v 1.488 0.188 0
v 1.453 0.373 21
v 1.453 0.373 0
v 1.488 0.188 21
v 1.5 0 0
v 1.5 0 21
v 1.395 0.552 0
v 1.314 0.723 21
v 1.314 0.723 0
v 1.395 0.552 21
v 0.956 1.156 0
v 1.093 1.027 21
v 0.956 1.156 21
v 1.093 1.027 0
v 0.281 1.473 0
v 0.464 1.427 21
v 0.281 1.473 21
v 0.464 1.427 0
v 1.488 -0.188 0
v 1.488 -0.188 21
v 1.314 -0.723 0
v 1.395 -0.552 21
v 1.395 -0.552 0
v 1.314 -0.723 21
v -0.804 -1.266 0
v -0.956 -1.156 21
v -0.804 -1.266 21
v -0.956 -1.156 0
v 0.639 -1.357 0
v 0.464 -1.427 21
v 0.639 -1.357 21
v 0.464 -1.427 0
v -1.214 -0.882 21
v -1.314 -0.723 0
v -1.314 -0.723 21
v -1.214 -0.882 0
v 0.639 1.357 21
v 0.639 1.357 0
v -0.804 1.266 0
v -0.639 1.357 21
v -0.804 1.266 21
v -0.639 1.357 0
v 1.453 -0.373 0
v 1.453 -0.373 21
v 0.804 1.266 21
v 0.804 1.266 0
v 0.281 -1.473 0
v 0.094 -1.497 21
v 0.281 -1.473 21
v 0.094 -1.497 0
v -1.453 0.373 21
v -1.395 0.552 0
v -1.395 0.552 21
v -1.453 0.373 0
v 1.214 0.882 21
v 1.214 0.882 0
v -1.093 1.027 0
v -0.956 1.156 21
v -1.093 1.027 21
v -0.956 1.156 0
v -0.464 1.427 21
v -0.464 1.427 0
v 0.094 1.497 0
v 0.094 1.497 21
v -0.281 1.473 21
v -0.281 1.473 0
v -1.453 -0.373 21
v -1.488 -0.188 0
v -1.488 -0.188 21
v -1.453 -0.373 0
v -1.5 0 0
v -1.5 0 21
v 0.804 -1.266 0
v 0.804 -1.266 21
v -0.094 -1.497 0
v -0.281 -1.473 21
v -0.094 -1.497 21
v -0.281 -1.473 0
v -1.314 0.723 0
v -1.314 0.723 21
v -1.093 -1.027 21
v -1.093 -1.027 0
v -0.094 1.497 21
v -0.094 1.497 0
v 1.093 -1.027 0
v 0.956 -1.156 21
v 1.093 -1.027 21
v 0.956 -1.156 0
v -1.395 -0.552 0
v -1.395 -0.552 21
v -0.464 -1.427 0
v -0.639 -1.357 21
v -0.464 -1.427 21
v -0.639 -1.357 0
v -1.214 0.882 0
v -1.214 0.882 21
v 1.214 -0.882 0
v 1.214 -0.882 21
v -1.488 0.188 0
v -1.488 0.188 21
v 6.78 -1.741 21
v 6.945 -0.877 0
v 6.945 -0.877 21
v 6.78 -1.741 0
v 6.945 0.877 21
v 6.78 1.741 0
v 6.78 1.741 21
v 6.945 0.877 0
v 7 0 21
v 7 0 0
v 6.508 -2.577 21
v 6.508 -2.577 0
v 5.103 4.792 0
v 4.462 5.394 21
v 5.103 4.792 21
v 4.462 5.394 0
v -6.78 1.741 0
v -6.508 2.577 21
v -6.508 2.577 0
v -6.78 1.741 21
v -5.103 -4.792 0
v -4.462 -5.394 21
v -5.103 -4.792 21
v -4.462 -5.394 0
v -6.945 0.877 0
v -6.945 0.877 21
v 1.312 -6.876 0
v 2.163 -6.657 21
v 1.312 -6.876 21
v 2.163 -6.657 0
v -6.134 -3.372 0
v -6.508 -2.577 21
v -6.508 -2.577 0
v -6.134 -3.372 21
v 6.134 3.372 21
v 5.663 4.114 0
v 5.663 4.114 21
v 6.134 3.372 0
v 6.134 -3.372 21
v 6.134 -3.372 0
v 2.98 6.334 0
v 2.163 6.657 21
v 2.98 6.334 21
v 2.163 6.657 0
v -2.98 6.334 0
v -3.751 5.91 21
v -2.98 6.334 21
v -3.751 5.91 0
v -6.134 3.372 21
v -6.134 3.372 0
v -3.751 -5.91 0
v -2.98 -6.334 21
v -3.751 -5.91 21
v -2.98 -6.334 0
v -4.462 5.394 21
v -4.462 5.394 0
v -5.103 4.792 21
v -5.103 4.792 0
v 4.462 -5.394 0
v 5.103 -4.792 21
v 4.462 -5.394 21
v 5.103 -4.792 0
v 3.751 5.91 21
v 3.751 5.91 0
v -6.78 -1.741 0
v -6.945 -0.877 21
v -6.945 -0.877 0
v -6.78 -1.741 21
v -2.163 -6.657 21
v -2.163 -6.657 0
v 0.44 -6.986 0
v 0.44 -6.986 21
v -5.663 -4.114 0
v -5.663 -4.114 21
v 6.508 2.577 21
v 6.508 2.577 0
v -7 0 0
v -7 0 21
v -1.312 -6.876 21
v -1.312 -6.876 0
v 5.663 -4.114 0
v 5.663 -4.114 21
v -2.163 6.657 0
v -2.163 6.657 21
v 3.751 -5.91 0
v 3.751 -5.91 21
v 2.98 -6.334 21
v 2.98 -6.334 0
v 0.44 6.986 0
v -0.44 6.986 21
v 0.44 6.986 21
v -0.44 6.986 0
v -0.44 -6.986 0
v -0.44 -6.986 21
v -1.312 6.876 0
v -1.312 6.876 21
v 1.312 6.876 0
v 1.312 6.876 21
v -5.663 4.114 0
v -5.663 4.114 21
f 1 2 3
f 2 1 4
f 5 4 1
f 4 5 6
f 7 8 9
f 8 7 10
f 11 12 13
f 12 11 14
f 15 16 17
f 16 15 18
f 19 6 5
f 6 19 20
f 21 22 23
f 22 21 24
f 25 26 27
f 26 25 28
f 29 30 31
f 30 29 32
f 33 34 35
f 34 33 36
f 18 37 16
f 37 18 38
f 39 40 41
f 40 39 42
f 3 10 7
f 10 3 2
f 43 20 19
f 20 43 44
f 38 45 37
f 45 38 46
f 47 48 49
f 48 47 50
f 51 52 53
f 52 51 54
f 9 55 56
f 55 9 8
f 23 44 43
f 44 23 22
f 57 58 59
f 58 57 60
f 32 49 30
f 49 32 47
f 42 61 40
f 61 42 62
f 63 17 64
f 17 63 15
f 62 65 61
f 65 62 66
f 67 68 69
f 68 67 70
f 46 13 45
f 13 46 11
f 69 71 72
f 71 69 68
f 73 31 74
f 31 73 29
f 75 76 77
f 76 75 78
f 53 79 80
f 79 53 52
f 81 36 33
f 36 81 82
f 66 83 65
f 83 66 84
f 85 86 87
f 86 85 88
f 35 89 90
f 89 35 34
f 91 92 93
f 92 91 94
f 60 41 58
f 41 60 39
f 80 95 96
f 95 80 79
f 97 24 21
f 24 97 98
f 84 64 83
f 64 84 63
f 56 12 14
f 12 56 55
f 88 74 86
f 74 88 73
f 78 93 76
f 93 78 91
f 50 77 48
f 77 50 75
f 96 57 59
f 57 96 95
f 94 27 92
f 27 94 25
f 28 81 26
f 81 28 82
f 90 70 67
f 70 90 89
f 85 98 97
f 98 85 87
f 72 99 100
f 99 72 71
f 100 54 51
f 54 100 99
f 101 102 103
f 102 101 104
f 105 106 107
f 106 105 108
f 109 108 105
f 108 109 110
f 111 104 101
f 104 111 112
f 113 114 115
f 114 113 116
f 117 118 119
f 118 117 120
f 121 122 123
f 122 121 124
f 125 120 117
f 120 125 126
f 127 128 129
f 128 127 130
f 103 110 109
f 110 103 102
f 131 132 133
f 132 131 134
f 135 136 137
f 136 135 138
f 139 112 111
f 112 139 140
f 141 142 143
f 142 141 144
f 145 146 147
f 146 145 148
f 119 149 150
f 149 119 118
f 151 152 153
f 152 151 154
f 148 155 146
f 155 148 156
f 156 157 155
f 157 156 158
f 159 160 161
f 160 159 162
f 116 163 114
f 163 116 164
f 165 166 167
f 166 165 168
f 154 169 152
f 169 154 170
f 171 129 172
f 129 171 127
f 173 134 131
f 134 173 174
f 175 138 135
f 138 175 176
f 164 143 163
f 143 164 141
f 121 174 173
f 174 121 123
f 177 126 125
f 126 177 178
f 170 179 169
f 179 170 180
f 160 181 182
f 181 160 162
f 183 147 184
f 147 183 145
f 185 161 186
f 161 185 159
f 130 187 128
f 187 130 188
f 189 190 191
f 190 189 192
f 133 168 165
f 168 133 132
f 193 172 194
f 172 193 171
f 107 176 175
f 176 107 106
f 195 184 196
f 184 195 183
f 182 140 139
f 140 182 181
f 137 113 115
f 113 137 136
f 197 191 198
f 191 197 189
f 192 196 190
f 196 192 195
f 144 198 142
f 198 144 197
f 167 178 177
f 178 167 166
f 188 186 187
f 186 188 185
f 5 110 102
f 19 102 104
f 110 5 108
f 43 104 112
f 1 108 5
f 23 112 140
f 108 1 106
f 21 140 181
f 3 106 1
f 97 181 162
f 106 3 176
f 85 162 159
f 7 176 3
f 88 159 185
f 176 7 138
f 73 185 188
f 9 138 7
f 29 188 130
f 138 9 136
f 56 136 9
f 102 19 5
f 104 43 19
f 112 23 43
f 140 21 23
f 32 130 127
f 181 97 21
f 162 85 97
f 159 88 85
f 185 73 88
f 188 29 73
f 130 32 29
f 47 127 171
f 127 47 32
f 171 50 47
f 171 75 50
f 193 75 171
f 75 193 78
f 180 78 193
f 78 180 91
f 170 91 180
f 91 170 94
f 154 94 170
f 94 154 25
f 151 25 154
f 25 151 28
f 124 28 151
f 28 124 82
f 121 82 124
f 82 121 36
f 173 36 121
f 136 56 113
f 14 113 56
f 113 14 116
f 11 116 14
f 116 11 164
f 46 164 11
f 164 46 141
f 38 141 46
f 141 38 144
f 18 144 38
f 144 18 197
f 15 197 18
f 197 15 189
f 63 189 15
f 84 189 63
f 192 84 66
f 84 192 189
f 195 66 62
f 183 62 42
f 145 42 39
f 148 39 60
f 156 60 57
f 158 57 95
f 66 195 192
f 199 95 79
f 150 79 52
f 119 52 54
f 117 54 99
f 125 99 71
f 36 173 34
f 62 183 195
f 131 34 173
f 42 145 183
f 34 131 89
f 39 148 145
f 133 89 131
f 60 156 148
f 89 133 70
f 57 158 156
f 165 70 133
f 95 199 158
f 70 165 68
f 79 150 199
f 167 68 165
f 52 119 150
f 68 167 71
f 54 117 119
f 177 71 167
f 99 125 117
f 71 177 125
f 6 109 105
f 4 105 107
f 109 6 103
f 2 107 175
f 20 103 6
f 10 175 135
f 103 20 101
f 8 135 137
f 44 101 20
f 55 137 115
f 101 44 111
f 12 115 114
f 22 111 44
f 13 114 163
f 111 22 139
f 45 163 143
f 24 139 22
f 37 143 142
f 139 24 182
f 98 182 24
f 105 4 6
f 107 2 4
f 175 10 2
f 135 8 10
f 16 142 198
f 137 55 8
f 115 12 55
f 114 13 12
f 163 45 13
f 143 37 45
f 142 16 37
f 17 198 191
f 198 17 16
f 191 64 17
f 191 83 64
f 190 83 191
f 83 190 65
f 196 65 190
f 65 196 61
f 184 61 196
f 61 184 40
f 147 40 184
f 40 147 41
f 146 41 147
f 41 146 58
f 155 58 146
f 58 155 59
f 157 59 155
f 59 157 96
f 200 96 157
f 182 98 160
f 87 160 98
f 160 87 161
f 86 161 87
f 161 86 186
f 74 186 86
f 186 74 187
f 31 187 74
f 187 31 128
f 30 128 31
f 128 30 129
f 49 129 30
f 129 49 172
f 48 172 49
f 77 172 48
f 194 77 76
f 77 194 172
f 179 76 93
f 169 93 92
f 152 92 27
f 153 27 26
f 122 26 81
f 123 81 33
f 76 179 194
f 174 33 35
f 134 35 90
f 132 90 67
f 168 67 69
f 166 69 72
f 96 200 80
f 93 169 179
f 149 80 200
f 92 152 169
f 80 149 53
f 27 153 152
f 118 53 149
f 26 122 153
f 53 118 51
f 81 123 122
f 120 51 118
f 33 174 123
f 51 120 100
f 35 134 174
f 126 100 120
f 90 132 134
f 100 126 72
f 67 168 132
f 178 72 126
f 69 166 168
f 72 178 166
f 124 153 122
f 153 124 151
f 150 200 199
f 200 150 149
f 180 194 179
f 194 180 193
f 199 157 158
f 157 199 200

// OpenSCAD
$fn = 50;


difference() {
	union() {
		cylinder(h = 21, r = 7.0000000000);
	}
	union() {
		translate(v = [0, 0, -100]) {
			cylinder(h = 200, r = 1.5000000000);
		}
		translate(v = [0, 0, -100]) {
			cylinder(h = 200, r = 1.5000000000);
		}
	}
}
